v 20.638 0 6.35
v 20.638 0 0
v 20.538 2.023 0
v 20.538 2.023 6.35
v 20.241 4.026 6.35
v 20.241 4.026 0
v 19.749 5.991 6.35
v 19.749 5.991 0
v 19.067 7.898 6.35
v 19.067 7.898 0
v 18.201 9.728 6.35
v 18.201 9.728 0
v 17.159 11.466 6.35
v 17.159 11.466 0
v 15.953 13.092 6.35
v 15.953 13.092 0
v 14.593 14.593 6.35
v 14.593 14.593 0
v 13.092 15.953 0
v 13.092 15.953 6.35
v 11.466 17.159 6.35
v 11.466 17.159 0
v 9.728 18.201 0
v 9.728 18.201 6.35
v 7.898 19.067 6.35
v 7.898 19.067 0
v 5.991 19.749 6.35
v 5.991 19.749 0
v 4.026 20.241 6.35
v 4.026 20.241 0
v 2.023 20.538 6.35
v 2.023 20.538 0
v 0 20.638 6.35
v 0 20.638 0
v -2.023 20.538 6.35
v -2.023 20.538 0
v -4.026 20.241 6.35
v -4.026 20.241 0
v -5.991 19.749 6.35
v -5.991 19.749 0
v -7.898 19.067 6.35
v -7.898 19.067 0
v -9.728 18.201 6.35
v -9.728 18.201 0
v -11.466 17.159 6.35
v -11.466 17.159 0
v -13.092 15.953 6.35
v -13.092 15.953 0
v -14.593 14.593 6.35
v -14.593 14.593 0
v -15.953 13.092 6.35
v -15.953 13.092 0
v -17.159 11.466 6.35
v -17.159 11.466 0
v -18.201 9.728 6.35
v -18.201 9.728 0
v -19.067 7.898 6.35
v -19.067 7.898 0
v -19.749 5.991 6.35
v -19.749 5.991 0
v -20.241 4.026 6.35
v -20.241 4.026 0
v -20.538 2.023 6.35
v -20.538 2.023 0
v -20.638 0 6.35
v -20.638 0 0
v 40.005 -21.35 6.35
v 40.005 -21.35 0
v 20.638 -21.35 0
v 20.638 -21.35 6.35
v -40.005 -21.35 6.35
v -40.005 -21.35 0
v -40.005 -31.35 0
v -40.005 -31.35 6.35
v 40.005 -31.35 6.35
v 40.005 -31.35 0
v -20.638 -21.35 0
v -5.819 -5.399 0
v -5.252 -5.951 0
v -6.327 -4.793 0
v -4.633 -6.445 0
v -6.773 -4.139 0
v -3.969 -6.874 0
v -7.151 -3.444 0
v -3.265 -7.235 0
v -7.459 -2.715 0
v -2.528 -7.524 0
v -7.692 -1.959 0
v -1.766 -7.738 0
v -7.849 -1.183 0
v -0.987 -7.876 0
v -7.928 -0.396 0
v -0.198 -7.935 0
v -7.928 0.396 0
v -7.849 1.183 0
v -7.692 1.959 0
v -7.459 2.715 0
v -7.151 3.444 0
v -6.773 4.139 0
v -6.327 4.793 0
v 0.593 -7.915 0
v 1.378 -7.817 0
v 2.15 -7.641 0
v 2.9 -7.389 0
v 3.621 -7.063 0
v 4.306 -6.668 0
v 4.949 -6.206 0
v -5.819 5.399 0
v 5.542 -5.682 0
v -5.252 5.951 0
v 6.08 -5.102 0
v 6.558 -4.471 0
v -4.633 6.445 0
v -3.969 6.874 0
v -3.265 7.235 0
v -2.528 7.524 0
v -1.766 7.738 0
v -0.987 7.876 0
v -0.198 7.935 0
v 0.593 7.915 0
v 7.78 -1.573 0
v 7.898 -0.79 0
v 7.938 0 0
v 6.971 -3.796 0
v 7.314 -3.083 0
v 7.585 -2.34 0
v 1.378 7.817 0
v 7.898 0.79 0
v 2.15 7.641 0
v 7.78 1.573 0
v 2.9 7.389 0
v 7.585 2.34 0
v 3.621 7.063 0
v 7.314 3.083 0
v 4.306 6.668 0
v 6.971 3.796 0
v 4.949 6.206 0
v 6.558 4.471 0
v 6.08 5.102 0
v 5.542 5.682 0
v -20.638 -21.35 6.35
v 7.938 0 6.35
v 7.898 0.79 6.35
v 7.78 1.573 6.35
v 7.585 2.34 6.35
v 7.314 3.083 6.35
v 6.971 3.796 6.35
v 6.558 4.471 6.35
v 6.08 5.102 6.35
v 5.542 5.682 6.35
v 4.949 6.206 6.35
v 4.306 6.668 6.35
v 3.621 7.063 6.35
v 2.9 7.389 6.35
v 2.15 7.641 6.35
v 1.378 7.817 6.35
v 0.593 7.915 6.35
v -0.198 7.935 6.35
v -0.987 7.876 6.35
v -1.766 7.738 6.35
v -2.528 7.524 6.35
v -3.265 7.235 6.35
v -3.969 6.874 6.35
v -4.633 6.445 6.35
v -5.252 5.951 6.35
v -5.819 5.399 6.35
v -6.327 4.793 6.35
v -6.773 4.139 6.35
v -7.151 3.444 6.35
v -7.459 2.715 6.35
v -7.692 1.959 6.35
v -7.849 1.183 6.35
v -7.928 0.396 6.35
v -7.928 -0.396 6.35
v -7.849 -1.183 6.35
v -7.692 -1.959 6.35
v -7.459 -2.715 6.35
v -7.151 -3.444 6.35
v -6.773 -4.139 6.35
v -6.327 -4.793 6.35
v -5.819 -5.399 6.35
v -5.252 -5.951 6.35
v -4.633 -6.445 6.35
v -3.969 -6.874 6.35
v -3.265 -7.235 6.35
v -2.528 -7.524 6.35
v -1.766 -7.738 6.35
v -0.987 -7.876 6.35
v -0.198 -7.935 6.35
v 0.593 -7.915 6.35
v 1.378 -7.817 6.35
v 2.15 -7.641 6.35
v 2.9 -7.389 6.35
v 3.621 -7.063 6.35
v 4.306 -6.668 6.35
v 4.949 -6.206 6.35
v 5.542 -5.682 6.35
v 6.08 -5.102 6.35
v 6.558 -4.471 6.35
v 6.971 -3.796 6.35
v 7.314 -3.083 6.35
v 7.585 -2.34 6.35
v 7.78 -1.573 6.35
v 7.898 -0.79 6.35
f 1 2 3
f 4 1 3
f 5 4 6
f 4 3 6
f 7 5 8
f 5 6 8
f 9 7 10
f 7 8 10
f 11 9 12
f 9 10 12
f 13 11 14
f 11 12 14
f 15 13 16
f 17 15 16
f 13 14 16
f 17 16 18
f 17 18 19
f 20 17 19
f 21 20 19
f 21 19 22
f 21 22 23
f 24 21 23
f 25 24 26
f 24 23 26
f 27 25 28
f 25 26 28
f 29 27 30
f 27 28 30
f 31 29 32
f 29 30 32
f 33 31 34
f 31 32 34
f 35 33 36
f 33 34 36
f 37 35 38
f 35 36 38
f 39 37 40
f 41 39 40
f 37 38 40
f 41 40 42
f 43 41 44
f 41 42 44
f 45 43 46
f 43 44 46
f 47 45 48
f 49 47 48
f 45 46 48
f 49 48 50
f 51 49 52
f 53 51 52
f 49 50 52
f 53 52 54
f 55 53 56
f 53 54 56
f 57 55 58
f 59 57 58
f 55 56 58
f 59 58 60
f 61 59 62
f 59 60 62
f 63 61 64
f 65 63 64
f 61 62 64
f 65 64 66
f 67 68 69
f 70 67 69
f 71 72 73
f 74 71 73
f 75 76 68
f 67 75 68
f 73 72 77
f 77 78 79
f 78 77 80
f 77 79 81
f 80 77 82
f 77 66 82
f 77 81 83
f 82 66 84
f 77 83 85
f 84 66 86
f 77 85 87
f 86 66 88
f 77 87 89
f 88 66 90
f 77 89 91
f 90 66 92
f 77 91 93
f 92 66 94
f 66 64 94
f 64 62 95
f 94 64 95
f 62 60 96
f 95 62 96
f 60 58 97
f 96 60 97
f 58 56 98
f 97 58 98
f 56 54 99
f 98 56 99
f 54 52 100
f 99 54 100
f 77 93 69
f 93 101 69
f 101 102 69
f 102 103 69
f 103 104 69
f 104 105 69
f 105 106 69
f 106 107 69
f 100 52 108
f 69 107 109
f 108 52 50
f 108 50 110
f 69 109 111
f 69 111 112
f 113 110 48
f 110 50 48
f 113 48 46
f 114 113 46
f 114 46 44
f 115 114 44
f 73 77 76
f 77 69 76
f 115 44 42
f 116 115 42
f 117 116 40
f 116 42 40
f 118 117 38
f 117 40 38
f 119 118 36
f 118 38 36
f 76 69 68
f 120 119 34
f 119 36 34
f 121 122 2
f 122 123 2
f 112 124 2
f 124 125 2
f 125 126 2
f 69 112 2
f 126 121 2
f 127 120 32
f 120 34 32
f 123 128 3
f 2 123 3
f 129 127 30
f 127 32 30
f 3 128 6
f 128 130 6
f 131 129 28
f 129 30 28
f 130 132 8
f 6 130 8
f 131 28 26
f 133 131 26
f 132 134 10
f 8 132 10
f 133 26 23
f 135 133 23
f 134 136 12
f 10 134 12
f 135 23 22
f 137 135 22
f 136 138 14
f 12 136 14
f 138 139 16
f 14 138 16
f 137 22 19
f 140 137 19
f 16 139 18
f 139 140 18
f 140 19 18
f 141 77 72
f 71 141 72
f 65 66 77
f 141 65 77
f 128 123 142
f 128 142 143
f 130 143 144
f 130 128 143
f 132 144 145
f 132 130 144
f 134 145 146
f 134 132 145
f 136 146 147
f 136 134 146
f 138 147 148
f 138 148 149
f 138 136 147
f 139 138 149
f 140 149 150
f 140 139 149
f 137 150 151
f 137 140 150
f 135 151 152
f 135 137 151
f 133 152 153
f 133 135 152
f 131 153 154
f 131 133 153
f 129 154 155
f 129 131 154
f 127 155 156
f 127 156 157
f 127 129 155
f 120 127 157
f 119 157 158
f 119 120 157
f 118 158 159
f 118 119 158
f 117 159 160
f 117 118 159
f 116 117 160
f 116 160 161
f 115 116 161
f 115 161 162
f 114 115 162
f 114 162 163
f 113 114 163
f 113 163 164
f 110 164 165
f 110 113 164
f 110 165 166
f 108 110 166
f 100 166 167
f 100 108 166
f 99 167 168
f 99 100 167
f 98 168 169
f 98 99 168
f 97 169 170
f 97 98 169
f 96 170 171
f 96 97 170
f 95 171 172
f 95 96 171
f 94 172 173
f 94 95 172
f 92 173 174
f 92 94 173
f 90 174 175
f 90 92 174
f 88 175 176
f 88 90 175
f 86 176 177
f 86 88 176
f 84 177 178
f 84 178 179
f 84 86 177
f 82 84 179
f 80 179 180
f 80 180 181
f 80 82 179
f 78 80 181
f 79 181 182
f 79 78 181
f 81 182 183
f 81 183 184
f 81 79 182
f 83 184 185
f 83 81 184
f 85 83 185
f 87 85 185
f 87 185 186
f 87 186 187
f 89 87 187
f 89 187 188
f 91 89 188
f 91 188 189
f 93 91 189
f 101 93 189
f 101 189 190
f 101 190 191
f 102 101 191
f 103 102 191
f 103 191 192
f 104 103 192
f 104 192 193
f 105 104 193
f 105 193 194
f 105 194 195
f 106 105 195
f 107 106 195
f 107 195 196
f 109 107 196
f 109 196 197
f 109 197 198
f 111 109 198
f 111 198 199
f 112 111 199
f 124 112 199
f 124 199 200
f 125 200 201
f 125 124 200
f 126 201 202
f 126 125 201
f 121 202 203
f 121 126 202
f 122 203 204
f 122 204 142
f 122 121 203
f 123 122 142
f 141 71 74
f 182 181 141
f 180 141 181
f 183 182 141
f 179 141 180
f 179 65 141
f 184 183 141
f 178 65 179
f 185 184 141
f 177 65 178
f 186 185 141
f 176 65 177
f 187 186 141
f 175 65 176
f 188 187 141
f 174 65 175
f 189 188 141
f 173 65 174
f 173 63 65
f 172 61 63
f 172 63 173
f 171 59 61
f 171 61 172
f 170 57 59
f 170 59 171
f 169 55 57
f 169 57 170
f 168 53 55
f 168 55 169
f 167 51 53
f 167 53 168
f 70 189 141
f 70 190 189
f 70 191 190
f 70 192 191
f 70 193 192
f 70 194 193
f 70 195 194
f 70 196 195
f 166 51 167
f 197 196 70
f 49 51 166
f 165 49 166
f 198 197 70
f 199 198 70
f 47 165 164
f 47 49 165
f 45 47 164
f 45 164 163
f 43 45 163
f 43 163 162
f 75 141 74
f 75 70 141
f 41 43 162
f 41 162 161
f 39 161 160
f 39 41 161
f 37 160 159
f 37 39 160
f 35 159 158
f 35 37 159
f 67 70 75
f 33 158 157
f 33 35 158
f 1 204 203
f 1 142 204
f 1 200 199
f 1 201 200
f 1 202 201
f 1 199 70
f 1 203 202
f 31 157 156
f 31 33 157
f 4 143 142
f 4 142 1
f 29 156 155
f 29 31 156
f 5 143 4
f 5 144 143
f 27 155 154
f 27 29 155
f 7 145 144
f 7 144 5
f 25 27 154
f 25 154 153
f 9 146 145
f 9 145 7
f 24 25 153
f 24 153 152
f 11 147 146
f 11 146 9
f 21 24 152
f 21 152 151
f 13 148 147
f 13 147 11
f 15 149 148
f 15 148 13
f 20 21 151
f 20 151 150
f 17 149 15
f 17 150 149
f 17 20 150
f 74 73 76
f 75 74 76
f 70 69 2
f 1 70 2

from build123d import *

# Parameters (mm, degrees)
SKETCH1_R           = 7.9375
BOSS_EXTRUDE1_DEPTH = 6.35


with BuildPart() as part:
    # Sketch1 → Boss-Extrude1 (new body)
    with BuildSketch(Plane.XY):
        with BuildLine():
            Line((-40.005, -31.35), (40.005, -31.35))
            Line((40.005, -31.35), (40.005, -21.35))
            Line((40.005, -21.35), (20.6375, -21.35))
            Line((20.6375, -21.35), (20.6375, 0))
            ThreePointArc((20.6375, 0), (0, 20.6375), (-20.6375, 0))
            Line((-20.6375, 0), (-20.6375, -21.35))
            Line((-20.6375, -21.35), (-40.005, -21.35))
            Line((-40.005, -21.35), (-40.005, -31.35))
        make_face()
        Circle(SKETCH1_R, mode=Mode.SUBTRACT)
    extrude(amount=BOSS_EXTRUDE1_DEPTH)


solid = part.part
